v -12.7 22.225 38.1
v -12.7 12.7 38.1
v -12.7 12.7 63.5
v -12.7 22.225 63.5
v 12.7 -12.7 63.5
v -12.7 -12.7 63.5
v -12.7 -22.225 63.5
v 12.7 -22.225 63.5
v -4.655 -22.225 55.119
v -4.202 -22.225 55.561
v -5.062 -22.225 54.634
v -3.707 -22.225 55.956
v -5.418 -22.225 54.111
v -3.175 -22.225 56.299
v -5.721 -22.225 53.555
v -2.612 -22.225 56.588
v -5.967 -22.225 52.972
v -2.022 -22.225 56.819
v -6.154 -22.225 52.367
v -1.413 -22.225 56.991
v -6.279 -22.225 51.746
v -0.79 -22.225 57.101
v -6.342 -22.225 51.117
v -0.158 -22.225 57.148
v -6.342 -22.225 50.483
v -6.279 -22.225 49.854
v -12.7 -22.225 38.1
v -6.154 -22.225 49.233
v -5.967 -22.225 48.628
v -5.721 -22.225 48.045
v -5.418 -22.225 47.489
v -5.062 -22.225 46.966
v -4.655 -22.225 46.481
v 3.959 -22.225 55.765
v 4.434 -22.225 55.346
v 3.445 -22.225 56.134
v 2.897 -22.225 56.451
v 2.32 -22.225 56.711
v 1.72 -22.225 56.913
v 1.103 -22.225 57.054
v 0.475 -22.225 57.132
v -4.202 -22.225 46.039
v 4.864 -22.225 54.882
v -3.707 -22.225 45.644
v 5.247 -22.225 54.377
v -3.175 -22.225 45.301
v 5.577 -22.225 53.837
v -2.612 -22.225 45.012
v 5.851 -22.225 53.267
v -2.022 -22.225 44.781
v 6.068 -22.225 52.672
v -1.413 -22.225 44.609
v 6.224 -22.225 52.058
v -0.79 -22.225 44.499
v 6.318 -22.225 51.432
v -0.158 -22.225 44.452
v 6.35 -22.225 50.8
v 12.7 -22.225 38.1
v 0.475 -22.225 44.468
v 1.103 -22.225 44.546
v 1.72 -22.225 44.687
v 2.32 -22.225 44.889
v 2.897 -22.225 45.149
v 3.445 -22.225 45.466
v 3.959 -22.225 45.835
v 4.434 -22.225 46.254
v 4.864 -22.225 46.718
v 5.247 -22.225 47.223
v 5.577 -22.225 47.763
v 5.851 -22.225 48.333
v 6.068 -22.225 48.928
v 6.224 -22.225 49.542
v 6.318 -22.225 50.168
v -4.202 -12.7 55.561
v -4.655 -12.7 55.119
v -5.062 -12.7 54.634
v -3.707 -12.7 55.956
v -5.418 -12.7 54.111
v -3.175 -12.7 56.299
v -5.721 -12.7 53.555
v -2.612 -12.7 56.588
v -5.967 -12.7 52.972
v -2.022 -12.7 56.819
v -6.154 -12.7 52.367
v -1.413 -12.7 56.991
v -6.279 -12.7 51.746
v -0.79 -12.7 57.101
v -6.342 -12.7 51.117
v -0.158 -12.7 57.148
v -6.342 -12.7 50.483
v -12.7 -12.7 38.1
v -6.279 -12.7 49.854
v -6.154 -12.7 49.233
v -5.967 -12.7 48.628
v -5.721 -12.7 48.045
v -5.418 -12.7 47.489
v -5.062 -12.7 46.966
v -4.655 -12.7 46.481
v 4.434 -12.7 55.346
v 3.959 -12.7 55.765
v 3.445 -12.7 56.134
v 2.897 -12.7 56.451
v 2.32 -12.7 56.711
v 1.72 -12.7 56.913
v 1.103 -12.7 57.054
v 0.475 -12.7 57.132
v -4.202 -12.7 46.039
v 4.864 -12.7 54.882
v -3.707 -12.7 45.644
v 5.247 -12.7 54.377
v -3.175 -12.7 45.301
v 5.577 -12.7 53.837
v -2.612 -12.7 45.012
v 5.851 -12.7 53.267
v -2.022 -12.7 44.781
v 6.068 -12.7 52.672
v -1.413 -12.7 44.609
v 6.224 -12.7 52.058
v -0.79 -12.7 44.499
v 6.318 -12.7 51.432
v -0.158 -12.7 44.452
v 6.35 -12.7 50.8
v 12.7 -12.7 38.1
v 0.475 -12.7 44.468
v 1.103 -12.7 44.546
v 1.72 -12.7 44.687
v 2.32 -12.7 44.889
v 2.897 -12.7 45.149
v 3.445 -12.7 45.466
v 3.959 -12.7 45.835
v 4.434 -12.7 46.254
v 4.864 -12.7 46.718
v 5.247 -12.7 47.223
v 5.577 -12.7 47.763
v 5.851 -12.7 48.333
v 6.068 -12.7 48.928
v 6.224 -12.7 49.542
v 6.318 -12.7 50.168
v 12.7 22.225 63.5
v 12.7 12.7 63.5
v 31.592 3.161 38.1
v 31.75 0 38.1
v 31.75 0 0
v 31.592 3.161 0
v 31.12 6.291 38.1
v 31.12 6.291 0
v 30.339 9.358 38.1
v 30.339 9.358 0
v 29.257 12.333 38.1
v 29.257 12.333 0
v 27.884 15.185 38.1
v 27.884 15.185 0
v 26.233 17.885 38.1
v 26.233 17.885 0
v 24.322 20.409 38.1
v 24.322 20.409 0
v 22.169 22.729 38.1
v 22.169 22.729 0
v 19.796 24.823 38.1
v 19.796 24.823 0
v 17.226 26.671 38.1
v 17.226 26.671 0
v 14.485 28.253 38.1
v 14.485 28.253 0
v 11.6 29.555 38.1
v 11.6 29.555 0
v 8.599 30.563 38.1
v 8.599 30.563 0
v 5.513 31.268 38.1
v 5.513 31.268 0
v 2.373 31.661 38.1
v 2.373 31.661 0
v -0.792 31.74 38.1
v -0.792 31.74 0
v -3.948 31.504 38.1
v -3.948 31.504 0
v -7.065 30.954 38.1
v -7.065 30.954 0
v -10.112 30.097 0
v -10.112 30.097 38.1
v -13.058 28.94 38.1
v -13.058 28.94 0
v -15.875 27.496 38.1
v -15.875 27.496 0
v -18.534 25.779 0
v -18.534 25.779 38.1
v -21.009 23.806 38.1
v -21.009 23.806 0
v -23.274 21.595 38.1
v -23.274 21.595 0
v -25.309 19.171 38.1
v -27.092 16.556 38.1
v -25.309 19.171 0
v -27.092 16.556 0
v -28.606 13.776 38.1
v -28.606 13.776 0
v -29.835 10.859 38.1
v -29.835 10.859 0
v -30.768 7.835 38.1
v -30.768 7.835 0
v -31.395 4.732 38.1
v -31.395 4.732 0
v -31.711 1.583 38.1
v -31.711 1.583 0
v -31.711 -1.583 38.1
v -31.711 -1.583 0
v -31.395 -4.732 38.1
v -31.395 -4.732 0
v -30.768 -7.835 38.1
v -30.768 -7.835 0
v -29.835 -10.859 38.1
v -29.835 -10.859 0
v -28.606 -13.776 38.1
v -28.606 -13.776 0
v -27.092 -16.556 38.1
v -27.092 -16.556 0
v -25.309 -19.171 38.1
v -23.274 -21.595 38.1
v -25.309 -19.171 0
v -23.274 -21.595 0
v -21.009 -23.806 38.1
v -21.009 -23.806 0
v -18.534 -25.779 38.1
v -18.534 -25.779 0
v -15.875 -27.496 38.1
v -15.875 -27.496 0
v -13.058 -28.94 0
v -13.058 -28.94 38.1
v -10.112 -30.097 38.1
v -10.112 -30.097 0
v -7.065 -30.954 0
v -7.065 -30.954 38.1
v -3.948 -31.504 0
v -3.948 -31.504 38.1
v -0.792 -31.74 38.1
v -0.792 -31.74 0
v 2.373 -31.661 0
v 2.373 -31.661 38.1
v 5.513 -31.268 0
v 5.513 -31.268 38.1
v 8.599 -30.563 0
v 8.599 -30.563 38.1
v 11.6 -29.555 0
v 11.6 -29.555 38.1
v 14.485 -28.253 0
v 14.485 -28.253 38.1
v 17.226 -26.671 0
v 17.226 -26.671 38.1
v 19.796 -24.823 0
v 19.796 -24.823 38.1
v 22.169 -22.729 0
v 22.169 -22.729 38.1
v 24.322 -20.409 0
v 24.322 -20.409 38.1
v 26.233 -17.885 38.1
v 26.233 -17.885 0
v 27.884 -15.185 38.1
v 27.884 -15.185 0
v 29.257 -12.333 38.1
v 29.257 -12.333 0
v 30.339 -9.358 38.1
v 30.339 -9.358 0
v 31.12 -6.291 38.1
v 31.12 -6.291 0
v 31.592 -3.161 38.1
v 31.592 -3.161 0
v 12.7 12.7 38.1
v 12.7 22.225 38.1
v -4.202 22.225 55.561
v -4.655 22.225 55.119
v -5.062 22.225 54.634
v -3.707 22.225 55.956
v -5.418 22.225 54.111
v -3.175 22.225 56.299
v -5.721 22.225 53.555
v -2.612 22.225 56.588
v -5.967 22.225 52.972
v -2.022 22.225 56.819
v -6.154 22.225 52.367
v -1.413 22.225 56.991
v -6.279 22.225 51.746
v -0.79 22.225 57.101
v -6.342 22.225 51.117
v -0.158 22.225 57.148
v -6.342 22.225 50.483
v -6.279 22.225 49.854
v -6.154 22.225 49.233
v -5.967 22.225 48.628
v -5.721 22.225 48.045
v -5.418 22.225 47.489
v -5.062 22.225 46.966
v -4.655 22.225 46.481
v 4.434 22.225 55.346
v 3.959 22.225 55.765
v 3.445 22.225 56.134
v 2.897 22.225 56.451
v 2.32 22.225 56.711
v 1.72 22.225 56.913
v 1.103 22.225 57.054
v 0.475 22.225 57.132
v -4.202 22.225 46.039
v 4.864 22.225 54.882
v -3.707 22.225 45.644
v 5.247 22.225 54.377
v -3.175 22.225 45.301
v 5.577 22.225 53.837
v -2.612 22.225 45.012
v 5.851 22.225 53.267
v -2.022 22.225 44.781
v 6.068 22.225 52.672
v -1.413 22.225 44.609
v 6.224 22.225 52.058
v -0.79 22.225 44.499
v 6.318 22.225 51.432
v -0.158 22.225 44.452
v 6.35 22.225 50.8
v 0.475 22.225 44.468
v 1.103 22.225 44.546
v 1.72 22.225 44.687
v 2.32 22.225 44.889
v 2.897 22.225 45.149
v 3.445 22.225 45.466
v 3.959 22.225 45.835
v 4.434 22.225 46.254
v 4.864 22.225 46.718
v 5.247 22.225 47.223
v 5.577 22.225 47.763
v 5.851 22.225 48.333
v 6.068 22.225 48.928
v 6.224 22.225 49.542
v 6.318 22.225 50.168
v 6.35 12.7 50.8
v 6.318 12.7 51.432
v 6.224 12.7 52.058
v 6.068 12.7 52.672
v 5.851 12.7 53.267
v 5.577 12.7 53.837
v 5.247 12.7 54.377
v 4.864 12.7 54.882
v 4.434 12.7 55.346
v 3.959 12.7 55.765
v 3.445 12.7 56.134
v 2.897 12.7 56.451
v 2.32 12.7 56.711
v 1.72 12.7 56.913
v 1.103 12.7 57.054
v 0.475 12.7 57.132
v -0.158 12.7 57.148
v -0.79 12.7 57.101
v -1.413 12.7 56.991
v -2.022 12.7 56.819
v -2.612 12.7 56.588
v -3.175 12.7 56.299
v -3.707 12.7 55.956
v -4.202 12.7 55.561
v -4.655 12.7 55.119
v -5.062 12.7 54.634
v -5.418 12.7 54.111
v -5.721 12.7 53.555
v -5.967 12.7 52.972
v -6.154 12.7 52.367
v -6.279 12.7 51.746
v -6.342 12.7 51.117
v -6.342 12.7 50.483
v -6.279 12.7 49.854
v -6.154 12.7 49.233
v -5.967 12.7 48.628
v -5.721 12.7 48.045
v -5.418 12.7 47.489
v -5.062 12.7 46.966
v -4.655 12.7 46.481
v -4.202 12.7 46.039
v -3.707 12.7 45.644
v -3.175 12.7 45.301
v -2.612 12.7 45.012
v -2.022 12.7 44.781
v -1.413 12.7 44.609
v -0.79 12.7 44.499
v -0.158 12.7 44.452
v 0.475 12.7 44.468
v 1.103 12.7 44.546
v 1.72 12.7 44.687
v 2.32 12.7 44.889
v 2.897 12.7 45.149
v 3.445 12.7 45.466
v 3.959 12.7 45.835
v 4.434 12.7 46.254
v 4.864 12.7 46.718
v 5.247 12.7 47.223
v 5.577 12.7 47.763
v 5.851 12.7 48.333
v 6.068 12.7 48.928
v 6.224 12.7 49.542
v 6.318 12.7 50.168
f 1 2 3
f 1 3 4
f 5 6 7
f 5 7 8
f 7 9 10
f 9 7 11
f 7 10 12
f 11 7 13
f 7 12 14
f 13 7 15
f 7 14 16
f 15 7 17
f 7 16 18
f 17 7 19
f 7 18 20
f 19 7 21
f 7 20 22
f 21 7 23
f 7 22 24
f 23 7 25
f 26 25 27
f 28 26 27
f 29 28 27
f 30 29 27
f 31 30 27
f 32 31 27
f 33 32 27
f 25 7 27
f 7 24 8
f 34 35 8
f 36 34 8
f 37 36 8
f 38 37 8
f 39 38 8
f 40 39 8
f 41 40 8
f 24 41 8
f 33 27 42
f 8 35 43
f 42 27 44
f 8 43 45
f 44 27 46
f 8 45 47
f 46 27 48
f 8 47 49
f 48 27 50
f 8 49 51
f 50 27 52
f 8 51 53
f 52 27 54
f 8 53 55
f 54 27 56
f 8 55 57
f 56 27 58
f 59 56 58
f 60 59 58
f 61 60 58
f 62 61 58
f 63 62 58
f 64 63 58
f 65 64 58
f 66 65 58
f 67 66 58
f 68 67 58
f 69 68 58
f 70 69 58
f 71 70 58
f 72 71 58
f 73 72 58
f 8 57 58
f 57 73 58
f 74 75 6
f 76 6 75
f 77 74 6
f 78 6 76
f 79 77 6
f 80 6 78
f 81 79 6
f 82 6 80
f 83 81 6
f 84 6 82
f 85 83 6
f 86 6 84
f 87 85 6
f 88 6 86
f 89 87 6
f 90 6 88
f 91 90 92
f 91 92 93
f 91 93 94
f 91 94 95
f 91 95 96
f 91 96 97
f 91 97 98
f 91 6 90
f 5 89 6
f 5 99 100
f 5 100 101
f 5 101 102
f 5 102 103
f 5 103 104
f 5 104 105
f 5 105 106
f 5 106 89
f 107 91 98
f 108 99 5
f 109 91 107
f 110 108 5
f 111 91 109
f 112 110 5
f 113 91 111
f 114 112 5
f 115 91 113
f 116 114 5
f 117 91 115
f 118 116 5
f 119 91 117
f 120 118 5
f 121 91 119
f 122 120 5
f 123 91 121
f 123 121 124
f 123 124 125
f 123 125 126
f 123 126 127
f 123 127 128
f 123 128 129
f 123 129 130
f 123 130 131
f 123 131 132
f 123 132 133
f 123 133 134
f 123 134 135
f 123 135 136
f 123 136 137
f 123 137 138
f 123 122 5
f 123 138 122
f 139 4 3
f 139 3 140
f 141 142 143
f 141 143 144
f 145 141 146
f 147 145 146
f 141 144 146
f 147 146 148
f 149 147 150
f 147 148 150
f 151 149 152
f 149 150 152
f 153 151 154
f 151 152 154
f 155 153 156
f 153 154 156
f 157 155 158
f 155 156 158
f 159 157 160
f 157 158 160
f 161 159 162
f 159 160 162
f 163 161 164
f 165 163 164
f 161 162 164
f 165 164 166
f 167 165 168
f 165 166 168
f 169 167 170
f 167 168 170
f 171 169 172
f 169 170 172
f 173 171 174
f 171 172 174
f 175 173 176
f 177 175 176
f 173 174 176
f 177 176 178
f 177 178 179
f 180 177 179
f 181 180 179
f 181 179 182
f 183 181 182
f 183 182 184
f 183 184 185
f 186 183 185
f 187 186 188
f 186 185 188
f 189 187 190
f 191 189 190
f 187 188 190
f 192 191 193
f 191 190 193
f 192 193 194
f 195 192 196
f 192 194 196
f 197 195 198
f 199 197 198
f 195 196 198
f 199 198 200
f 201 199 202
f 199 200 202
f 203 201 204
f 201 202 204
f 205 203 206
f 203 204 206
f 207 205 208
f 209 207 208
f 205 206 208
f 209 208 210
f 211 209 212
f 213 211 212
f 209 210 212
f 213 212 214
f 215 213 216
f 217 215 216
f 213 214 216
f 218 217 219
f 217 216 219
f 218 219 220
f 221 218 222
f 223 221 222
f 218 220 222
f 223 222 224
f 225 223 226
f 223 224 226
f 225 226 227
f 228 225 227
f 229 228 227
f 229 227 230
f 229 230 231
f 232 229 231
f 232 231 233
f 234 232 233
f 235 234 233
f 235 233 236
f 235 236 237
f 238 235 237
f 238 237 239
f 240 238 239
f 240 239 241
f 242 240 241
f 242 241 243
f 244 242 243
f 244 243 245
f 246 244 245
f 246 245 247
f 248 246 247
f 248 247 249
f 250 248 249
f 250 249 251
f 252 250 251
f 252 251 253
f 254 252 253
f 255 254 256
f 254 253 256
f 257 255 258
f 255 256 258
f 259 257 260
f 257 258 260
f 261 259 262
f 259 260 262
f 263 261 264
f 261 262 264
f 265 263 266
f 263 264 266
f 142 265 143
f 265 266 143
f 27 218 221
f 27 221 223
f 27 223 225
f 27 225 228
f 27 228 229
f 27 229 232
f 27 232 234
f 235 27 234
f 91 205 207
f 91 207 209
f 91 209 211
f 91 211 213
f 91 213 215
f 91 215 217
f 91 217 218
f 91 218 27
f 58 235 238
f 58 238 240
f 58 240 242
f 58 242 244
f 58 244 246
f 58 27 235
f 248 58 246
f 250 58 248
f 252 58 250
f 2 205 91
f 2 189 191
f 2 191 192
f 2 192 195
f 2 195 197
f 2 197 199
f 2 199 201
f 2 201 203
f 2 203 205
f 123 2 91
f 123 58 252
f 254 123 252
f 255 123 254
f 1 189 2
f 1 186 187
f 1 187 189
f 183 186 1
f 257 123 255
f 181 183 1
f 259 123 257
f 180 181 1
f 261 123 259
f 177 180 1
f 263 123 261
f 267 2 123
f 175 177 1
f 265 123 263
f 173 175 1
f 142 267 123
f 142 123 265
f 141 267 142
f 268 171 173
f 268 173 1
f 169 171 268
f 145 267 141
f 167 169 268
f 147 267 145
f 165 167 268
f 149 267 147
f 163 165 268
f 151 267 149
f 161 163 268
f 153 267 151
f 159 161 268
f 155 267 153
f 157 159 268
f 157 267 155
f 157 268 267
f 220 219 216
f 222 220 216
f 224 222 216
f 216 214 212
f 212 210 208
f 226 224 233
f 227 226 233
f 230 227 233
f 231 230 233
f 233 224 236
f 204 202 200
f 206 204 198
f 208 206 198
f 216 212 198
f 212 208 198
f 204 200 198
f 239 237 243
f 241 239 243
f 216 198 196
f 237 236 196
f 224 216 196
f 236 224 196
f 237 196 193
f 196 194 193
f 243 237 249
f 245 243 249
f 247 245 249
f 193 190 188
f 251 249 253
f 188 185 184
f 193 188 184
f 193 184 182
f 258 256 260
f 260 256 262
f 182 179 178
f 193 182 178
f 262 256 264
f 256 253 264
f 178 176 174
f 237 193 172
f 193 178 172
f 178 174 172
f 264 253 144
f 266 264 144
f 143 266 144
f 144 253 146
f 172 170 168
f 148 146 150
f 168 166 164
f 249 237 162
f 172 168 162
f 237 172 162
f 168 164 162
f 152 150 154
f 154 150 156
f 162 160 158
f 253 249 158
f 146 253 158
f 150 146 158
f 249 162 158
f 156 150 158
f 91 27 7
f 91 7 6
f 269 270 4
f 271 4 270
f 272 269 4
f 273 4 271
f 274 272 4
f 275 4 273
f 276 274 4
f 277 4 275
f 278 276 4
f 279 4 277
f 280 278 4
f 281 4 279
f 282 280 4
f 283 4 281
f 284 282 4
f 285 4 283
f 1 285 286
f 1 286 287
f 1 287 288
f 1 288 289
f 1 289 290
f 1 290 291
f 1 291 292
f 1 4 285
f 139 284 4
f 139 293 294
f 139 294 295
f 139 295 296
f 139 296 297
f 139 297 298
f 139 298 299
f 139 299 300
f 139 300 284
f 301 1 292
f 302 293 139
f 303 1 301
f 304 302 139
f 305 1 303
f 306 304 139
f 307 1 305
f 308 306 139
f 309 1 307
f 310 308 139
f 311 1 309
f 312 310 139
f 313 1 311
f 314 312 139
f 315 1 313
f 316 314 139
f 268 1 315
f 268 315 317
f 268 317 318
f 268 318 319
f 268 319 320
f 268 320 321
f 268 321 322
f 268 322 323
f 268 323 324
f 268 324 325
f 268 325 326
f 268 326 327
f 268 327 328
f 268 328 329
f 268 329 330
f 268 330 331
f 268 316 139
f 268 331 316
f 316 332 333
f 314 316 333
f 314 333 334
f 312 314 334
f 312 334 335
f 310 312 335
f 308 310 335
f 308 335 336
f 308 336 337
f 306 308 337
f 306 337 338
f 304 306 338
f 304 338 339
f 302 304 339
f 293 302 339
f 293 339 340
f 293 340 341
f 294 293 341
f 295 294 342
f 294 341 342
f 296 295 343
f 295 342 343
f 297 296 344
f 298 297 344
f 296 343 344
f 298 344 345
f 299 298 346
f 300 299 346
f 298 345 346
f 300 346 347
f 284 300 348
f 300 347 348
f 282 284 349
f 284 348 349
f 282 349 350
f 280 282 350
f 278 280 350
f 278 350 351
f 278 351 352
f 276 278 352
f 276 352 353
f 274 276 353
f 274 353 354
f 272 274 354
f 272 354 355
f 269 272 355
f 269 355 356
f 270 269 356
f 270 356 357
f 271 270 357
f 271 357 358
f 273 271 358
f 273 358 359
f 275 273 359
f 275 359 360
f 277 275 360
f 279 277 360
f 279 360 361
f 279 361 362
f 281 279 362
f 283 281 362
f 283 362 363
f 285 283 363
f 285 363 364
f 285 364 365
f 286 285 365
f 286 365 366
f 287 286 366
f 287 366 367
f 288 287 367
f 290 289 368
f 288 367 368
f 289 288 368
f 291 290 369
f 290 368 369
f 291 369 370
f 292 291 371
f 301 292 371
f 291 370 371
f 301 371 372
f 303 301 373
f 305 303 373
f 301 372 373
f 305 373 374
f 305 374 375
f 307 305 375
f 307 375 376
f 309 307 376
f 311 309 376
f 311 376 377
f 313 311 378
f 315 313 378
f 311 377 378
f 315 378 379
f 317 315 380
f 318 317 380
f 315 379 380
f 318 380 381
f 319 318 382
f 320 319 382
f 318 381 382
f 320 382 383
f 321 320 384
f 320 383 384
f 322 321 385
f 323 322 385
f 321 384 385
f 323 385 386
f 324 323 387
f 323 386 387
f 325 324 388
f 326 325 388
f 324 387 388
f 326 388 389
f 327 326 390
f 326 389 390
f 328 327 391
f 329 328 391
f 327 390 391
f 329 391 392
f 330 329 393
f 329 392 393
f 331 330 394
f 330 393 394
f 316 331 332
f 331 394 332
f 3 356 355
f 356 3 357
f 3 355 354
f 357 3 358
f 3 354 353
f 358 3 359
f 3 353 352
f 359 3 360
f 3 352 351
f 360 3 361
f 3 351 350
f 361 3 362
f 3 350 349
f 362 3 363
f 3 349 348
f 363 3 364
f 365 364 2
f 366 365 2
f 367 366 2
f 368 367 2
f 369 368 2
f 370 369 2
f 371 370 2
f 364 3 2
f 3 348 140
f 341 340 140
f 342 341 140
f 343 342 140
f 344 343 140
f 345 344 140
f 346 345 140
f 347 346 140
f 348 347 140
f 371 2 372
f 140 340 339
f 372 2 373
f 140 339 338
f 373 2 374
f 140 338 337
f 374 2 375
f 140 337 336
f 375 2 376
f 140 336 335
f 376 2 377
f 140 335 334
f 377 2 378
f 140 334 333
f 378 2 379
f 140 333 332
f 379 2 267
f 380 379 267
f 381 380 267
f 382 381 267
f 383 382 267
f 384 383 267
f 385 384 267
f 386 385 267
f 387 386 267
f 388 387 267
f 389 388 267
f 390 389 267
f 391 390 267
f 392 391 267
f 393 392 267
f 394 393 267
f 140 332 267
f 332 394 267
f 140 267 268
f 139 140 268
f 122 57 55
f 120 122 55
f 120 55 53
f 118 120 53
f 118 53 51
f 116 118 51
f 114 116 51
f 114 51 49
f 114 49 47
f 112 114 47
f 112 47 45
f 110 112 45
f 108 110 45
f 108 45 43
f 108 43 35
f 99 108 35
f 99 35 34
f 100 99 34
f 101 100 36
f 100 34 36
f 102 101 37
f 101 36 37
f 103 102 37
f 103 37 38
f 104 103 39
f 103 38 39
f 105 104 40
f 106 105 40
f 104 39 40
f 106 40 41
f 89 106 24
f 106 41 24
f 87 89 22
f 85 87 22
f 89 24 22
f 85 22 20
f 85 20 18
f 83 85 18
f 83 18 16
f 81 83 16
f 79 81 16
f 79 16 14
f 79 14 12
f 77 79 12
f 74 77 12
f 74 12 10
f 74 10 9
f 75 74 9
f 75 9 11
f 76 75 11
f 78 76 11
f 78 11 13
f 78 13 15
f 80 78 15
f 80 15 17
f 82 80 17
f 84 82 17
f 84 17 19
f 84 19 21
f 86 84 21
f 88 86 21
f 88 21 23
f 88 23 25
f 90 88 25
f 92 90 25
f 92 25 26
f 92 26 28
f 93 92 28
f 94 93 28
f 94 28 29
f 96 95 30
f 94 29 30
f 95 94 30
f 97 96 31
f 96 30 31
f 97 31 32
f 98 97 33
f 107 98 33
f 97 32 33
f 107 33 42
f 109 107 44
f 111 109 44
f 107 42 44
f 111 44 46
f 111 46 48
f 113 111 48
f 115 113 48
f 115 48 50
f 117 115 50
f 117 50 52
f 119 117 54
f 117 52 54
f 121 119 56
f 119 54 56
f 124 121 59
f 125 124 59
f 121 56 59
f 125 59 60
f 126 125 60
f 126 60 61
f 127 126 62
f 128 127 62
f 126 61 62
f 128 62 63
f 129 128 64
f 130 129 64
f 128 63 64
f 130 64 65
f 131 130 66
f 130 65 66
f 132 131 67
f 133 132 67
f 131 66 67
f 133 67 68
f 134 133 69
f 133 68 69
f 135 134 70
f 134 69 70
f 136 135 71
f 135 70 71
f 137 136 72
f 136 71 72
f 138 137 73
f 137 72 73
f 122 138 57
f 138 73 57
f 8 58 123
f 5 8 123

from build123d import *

# Parameters (mm, degrees)
F0_R     = 31.75
F1_DEPTH = 38.1
F2_W     = 25.4
F2_H     = 9.525
F3_DEPTH = 25.4
F4_R     = 6.35
F5_DEPTH = 44.45


with BuildPart() as f1:
    # F0 (on Top) → F1 (new body)
    with BuildSketch(Plane.XY):
        Circle(F0_R)
    extrude(amount=F1_DEPTH)

    # F2 (on face) → F3 (join)
    with BuildSketch(Plane.XY.offset(38.1)):
        with Locations((0, 17.4625)):
            Rectangle(F2_W, F2_H)
        with Locations((0, -17.4625)):
            Rectangle(F2_W, F2_H)
    extrude(amount=F3_DEPTH)

    # F4 (on face) → F5 (cut, through all)
    with BuildSketch(Plane.XZ.offset(22.225)):
        with Locations((0, 50.8)):
            Circle(F4_R)
    extrude(amount=-F5_DEPTH, mode=Mode.SUBTRACT)


solid = f1.part
